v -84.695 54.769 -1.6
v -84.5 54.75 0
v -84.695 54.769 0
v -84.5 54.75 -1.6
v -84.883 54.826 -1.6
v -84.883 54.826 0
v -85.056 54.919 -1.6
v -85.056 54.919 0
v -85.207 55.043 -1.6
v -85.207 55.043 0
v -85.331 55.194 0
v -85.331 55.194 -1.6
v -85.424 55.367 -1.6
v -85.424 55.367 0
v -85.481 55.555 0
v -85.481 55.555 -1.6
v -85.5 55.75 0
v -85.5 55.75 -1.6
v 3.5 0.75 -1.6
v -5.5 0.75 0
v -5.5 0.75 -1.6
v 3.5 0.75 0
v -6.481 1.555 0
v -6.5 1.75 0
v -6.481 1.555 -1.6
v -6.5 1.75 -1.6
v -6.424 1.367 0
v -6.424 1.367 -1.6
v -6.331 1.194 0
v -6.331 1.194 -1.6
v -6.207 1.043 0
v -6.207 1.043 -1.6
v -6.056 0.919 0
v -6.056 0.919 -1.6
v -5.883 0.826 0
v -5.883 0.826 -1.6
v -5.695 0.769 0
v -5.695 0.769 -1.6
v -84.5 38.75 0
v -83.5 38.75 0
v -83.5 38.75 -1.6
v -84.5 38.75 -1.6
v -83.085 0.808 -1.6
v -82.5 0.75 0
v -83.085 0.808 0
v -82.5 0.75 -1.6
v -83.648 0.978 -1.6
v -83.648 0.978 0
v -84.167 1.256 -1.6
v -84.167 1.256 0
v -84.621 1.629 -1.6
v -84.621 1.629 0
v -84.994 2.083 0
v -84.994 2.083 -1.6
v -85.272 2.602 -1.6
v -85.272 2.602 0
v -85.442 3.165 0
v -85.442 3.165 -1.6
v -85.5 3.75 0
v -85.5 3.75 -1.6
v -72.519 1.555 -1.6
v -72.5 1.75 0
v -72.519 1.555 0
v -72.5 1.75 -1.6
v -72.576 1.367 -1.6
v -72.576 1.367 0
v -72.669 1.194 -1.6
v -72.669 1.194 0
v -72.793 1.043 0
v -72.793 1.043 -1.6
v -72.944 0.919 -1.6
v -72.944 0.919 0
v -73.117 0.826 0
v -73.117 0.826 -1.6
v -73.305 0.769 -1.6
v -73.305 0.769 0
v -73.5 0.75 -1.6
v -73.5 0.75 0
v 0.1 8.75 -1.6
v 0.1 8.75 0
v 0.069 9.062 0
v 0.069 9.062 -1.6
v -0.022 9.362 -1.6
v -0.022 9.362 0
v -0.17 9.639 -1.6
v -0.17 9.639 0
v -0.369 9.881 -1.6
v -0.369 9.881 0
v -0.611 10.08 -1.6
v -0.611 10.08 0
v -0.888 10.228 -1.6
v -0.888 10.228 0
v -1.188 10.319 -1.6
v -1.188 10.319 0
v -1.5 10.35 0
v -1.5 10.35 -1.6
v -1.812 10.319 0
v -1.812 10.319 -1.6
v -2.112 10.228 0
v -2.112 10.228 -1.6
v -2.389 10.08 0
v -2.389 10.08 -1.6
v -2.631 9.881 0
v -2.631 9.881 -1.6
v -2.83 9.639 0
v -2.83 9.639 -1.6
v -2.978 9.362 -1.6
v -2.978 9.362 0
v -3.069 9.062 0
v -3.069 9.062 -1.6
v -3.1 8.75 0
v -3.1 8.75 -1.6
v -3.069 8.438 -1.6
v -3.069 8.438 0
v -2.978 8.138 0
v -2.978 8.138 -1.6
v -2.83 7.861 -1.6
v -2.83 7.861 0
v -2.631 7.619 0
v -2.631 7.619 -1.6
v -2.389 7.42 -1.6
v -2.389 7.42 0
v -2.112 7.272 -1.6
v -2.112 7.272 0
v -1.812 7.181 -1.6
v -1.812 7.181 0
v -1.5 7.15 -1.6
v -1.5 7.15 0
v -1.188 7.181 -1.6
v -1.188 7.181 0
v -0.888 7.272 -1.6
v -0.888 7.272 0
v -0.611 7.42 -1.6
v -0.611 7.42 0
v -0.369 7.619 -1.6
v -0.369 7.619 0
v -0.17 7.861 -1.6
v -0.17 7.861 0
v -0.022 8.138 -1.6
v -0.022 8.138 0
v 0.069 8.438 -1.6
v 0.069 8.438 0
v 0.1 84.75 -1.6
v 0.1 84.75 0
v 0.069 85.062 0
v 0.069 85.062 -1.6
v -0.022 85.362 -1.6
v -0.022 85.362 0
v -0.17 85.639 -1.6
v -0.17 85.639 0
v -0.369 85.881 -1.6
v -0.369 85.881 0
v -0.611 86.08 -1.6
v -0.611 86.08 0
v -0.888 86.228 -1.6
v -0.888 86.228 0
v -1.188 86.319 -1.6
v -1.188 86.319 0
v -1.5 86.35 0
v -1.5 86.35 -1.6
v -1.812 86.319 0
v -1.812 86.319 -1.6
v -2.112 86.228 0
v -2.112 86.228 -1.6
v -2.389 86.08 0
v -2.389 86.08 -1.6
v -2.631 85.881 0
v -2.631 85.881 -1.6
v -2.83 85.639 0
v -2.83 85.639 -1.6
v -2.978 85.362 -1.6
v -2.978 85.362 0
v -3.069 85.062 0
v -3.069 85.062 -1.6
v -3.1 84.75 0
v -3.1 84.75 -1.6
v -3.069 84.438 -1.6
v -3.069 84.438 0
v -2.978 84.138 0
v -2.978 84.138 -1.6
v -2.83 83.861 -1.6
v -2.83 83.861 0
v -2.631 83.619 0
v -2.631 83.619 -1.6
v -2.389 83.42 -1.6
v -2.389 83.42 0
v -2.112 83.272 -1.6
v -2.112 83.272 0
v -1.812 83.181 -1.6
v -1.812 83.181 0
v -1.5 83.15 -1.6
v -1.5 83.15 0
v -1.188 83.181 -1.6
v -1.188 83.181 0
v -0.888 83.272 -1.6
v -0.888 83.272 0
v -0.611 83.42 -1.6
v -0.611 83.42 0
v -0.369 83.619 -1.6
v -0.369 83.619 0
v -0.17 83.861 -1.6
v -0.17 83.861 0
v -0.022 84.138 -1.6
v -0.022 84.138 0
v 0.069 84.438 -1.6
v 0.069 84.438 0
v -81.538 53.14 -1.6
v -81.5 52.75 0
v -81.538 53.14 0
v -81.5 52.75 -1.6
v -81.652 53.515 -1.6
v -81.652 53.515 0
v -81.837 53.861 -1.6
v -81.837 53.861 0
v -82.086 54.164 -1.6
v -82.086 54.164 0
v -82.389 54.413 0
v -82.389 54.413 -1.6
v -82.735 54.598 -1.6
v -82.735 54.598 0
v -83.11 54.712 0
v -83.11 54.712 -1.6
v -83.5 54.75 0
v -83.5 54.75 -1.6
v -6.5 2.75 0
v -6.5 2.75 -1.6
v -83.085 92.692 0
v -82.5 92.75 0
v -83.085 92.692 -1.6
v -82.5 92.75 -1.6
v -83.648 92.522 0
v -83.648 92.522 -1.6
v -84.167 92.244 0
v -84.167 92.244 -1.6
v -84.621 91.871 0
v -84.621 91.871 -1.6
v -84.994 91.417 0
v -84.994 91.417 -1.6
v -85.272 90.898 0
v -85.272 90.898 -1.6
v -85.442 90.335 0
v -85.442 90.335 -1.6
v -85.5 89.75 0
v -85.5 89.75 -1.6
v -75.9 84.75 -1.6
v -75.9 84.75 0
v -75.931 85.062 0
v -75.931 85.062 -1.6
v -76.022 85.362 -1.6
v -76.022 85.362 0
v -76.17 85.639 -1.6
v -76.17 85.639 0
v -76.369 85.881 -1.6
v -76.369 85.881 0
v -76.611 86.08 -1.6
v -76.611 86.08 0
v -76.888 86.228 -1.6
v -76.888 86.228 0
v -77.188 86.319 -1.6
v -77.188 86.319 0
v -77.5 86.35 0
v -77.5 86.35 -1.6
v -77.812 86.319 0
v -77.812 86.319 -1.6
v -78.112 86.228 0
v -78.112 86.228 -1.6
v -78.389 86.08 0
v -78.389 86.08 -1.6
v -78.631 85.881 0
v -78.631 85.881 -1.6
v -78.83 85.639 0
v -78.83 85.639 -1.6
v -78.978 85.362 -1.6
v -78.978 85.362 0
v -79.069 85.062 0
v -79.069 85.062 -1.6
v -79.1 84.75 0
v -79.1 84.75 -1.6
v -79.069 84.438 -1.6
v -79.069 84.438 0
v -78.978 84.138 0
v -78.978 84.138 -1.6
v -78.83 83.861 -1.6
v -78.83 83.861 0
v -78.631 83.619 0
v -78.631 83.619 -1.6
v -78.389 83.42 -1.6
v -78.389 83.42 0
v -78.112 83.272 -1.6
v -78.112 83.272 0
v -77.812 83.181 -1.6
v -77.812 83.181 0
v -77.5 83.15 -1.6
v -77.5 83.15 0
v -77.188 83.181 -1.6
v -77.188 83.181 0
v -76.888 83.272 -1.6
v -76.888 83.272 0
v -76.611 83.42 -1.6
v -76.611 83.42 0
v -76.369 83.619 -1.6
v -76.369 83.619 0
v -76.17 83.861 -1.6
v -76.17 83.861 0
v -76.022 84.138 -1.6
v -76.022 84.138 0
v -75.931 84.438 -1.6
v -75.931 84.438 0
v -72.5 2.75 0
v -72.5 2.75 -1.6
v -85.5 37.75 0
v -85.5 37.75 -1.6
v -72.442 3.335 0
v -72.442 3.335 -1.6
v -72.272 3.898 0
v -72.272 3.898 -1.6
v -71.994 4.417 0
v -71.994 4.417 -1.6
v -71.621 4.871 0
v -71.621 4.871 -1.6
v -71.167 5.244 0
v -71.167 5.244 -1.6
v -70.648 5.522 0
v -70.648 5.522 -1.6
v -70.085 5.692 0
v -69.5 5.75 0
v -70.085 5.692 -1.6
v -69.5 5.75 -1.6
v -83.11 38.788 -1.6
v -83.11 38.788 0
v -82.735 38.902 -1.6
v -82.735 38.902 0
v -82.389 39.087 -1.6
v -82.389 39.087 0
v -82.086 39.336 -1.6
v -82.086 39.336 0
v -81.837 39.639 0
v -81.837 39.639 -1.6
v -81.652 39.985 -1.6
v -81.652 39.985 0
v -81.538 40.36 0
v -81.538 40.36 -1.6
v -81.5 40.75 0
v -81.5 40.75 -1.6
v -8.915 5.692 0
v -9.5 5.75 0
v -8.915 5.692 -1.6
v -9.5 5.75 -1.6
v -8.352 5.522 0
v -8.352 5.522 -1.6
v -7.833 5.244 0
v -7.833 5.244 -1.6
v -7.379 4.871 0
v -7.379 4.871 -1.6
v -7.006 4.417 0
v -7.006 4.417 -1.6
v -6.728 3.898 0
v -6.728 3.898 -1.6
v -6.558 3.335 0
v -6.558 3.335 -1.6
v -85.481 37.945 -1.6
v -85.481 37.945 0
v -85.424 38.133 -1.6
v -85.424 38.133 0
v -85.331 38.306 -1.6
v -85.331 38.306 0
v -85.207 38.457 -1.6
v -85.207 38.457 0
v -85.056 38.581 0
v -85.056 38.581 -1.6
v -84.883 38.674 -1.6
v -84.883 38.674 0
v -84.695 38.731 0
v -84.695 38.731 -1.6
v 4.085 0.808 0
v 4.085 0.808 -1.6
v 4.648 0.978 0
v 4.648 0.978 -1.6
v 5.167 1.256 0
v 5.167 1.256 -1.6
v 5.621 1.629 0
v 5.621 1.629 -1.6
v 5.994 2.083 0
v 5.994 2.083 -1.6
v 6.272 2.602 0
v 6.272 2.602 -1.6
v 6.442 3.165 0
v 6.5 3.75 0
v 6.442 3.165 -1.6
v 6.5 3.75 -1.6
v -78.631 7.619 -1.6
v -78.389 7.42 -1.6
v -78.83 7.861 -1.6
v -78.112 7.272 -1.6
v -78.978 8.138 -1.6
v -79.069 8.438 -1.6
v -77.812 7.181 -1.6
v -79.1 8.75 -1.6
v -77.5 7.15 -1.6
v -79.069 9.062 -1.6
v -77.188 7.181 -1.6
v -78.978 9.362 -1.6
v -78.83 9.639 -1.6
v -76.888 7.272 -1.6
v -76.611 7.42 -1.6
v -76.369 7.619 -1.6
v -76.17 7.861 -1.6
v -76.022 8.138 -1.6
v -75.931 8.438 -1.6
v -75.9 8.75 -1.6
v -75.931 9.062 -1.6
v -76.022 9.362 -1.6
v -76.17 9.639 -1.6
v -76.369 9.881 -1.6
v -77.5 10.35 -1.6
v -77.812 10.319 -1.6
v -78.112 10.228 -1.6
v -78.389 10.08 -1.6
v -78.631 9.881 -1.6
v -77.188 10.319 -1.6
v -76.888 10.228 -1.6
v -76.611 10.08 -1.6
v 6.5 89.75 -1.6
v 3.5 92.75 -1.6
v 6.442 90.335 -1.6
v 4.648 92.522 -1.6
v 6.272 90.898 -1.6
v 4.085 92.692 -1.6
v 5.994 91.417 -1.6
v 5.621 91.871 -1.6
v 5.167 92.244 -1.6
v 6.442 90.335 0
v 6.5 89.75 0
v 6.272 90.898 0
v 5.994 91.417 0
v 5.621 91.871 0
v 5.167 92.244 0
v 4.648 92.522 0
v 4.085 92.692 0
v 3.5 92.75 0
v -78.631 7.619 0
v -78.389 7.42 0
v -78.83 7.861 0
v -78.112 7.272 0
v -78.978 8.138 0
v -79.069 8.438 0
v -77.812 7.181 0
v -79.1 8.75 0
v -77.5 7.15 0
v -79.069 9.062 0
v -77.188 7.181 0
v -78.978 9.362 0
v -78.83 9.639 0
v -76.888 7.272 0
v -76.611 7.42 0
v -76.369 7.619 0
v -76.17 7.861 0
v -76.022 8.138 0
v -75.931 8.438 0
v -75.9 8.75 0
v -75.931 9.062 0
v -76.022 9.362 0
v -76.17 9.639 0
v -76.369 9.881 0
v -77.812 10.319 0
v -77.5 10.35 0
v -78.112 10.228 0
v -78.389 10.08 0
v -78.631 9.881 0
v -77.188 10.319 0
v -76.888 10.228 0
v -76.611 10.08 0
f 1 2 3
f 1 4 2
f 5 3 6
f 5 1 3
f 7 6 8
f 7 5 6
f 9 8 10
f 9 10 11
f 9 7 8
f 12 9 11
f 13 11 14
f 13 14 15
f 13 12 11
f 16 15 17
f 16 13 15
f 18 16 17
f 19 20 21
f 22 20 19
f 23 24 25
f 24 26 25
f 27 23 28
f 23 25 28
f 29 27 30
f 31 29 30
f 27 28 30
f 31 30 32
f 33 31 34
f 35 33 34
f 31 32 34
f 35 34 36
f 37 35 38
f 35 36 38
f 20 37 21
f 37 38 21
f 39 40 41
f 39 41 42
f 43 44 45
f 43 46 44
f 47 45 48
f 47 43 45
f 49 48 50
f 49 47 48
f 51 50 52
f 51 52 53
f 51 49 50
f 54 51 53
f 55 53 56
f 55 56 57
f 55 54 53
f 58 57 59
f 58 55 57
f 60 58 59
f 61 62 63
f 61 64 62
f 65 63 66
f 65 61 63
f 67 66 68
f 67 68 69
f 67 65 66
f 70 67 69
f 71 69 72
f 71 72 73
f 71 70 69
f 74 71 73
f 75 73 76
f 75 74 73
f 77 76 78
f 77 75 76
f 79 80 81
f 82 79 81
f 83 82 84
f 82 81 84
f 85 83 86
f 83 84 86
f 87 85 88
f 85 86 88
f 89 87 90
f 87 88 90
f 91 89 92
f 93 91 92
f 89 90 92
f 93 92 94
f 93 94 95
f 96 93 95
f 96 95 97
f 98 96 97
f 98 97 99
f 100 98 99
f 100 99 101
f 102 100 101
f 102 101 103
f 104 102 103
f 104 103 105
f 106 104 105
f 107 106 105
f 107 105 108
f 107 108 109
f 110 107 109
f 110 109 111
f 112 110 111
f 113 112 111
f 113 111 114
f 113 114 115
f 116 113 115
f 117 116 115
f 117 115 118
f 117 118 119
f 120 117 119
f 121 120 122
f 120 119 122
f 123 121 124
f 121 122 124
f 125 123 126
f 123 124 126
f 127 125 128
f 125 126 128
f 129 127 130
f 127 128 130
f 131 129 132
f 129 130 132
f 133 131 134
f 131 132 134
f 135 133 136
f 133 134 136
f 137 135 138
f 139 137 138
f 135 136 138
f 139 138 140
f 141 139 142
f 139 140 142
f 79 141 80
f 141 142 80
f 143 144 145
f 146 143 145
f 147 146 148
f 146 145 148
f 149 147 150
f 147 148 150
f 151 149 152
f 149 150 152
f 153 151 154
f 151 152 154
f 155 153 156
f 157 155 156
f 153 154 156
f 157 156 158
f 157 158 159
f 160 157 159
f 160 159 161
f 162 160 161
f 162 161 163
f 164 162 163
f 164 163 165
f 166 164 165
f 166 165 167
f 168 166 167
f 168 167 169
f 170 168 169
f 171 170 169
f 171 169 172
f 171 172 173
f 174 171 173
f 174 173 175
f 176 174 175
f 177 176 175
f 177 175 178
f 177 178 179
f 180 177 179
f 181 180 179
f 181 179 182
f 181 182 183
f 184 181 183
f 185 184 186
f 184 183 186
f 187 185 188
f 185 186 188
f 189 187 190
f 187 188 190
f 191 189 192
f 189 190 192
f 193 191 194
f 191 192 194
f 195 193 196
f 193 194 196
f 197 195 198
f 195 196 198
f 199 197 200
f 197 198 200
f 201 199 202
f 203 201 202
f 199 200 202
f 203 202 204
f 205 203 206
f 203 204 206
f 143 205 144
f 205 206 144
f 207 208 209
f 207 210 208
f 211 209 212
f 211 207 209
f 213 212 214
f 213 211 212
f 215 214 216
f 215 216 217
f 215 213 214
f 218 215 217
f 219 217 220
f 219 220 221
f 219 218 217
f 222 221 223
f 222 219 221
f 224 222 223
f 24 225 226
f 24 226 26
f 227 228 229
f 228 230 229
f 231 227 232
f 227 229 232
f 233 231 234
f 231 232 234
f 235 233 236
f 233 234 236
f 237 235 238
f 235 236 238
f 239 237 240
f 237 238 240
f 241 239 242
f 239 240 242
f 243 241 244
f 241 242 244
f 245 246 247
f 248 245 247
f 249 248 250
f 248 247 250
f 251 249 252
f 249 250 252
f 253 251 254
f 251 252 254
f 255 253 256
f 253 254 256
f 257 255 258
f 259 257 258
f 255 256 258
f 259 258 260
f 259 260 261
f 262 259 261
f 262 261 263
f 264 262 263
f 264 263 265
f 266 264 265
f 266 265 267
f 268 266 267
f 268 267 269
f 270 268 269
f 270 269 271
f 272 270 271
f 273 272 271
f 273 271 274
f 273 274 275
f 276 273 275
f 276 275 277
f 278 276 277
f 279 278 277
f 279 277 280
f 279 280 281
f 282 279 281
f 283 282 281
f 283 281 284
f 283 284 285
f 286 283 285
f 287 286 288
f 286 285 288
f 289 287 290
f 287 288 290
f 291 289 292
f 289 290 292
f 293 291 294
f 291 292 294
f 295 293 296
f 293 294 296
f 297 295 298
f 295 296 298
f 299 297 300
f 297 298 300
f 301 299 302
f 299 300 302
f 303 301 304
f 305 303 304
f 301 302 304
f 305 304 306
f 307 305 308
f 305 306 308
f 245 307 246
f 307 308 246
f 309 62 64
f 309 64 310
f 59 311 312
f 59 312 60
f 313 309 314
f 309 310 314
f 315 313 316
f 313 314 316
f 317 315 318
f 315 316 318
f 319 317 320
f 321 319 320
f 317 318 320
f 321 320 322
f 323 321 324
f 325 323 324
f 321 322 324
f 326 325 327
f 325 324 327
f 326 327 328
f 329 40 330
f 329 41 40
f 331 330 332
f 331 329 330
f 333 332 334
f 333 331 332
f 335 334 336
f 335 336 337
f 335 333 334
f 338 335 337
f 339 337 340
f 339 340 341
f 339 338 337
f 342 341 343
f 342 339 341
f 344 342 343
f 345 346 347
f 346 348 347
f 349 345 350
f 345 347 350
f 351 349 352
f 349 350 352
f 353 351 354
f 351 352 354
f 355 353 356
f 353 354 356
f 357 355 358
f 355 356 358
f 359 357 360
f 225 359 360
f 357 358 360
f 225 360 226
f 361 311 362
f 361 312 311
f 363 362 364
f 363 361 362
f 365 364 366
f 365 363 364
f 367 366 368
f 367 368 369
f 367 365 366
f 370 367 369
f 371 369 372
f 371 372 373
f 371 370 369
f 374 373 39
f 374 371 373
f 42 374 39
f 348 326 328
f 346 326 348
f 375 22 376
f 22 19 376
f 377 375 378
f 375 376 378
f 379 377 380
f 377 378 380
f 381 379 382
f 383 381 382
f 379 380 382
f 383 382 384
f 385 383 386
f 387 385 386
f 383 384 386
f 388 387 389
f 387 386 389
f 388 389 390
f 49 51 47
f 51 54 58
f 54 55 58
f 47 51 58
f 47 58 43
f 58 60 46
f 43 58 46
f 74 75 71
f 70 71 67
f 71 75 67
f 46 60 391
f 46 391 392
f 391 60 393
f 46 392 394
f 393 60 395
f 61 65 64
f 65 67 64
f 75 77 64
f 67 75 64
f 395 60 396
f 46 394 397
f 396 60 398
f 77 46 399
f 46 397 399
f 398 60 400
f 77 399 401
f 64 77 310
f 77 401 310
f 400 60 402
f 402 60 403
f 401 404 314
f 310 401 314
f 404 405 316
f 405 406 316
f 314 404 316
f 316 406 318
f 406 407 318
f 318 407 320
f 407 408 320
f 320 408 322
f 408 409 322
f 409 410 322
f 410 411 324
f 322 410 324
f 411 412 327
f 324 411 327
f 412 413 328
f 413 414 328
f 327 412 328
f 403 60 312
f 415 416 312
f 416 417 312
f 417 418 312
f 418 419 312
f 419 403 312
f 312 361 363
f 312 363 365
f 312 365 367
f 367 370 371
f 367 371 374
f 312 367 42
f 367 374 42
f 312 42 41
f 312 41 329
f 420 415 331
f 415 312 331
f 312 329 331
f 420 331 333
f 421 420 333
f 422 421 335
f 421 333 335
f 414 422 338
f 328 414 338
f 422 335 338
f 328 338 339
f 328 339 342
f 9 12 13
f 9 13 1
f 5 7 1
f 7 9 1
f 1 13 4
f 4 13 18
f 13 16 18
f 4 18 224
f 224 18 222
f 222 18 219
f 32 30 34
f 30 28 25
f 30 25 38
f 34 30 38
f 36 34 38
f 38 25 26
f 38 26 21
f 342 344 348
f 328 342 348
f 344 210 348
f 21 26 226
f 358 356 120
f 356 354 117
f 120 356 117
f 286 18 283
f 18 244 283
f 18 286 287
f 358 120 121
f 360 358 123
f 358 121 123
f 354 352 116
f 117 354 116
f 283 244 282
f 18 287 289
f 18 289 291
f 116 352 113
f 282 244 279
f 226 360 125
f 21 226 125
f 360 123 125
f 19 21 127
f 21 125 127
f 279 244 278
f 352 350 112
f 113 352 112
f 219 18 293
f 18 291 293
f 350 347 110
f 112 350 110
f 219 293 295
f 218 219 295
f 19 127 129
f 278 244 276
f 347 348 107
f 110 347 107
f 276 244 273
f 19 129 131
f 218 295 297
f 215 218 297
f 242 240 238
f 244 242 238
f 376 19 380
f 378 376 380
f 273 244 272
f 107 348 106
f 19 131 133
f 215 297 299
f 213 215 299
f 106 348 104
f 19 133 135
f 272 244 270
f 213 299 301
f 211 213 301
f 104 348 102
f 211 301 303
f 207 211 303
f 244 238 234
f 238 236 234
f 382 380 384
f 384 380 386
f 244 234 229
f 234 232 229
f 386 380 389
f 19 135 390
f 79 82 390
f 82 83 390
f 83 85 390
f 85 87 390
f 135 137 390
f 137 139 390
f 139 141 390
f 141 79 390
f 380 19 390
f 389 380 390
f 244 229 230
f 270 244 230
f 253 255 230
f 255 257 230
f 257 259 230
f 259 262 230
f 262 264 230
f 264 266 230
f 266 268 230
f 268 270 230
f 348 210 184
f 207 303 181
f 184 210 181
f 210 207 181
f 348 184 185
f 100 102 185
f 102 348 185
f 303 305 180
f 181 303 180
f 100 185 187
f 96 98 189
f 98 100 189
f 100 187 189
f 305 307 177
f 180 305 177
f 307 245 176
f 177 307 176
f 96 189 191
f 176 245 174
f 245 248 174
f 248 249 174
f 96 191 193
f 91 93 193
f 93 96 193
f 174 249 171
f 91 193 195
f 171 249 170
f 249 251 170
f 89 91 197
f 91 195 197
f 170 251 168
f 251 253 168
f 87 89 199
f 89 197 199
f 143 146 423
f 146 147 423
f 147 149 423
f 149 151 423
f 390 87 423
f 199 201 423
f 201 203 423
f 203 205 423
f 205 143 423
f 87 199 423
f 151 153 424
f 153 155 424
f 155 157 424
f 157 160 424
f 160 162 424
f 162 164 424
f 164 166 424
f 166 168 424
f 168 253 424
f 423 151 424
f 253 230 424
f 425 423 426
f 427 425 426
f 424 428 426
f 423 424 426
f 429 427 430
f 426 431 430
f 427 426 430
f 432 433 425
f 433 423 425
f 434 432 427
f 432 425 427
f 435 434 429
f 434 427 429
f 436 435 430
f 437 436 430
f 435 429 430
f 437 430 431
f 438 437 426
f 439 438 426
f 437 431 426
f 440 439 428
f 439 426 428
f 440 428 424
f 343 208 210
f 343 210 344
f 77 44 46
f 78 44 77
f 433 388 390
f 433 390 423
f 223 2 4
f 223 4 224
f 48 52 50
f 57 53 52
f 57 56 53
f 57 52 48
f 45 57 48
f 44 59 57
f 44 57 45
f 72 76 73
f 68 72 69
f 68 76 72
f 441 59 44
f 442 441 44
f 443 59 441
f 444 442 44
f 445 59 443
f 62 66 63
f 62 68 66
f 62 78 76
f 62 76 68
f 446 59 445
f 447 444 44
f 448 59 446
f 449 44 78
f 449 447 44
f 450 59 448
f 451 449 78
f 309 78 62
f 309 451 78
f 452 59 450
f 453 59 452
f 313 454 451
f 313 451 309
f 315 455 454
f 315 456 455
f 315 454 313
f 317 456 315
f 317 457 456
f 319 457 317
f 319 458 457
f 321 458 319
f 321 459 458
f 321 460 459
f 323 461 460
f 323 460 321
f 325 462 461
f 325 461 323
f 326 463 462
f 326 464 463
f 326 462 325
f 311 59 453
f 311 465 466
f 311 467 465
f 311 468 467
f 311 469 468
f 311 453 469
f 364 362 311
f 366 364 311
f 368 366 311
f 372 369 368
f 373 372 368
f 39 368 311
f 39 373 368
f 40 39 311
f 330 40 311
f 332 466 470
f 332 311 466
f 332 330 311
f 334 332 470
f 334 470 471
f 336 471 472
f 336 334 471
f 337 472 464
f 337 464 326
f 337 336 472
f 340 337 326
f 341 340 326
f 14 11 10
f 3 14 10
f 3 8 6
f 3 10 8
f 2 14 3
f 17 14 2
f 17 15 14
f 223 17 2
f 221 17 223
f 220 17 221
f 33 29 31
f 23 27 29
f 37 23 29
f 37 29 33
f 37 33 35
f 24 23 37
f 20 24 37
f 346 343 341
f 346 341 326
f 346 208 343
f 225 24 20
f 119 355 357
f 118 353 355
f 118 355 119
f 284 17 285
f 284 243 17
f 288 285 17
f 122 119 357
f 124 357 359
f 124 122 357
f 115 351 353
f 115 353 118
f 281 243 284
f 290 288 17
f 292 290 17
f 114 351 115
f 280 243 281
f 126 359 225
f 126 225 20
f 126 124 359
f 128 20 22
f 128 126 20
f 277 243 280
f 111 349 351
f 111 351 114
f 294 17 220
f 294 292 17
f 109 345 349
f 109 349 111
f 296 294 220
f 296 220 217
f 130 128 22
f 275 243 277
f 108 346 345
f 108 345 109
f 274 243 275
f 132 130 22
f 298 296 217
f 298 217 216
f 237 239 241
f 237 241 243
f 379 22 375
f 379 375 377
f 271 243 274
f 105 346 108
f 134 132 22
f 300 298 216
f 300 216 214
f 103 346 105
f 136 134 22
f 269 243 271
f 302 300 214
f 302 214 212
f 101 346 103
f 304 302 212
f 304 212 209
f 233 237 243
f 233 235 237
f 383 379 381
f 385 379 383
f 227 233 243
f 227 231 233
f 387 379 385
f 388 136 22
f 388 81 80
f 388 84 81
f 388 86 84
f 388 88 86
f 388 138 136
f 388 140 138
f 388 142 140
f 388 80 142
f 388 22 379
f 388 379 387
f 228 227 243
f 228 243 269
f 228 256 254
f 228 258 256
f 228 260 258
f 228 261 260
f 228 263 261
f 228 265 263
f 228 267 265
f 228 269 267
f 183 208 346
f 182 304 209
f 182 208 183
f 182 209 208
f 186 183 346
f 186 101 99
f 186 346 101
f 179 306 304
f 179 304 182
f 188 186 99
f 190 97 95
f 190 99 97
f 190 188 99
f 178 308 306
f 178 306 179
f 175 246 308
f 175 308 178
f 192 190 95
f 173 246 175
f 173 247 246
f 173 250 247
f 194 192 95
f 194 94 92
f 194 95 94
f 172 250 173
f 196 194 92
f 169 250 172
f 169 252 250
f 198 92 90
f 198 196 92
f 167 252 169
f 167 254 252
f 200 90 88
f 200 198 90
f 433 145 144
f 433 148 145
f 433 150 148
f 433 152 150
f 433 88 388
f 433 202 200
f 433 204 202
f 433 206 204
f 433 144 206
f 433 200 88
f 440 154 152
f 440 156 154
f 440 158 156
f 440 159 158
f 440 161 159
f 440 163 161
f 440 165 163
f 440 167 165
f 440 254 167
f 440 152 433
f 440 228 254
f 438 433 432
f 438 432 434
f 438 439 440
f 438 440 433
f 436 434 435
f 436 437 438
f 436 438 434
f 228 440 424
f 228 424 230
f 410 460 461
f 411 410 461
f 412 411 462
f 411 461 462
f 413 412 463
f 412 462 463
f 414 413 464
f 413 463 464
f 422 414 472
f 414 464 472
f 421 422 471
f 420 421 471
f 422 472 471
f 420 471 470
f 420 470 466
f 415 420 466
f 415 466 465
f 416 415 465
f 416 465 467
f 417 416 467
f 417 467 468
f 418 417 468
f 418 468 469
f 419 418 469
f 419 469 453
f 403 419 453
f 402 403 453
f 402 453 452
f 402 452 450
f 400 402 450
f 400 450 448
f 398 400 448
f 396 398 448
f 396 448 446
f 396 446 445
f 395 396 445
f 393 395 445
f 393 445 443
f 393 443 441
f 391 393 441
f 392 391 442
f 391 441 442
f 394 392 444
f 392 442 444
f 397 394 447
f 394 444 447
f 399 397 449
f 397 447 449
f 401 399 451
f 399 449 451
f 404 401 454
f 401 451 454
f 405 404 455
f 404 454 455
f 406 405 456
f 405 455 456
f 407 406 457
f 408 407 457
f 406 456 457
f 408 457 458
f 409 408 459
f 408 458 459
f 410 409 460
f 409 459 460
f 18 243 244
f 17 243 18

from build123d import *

# Parameters (mm, degrees)
BOSS_EXTRUDE1_DEPTH        = 1.6
F_3_2_3_2_DIAMETER_HOLE1_D = 3.2
FILLET1_R                  = 3
FILLET2_R                  = 1
FILLET3_R                  = 2


with BuildPart() as part:
    # Sketch1 → Boss-Extrude1 (new body)
    with BuildSketch(Plane.XY):
        Polygon((-72.5, 0.75), (-72.5, 5.75), (-6.5, 5.75), (-6.5, 0.75), (6.5, 0.75), (6.5, 92.75), (-85.5, 92.75), (-85.5, 54.75), (-81.5, 54.75), (-81.5, 38.75), (-85.5, 38.75), (-85.5, 0.75), align=None)
    extrude(amount=-BOSS_EXTRUDE1_DEPTH)

    # Ø3.2 (3.2) Diameter Hole1 (through all)
    with Locations(Plane(origin=(0, 0, -1.6), x_dir=(-1, 0, 0), z_dir=(0, 0, -1))):
        with Locations((1.5, 84.75), (1.5, 8.75), (77.5, 8.75), (77.5, 84.75)):
            Hole(F_3_2_3_2_DIAMETER_HOLE1_D / 2)

    # Fillet1
    fillet1_edges = [part.edges().sort_by_distance(p)[0] for p in [
        (6.5, 0.75, -0.8),
        (-6.5, 5.75, -0.8),
        (-72.5, 5.75, -0.8),
        (-85.5, 0.75, -0.8),
        (-85.5, 92.75, -0.8),
        (6.5, 92.75, -0.8),
    ]]
    fillet(fillet1_edges, radius=FILLET1_R)

    # Fillet2
    fillet2_edges = [part.edges().sort_by_distance(p)[0] for p in [
        (-6.5, 0.75, -0.8),
        (-72.5, 0.75, -0.8),
        (-85.5, 38.75, -0.8),
        (-85.5, 54.75, -0.8),
    ]]
    fillet(fillet2_edges, radius=FILLET2_R)

    # Fillet3
    fillet3_edges = [part.edges().sort_by_distance(p)[0] for p in [
        (-81.5, 38.75, -0.8),
        (-81.5, 54.75, -0.8),
    ]]
    fillet(fillet3_edges, radius=FILLET3_R)


solid = part.part
